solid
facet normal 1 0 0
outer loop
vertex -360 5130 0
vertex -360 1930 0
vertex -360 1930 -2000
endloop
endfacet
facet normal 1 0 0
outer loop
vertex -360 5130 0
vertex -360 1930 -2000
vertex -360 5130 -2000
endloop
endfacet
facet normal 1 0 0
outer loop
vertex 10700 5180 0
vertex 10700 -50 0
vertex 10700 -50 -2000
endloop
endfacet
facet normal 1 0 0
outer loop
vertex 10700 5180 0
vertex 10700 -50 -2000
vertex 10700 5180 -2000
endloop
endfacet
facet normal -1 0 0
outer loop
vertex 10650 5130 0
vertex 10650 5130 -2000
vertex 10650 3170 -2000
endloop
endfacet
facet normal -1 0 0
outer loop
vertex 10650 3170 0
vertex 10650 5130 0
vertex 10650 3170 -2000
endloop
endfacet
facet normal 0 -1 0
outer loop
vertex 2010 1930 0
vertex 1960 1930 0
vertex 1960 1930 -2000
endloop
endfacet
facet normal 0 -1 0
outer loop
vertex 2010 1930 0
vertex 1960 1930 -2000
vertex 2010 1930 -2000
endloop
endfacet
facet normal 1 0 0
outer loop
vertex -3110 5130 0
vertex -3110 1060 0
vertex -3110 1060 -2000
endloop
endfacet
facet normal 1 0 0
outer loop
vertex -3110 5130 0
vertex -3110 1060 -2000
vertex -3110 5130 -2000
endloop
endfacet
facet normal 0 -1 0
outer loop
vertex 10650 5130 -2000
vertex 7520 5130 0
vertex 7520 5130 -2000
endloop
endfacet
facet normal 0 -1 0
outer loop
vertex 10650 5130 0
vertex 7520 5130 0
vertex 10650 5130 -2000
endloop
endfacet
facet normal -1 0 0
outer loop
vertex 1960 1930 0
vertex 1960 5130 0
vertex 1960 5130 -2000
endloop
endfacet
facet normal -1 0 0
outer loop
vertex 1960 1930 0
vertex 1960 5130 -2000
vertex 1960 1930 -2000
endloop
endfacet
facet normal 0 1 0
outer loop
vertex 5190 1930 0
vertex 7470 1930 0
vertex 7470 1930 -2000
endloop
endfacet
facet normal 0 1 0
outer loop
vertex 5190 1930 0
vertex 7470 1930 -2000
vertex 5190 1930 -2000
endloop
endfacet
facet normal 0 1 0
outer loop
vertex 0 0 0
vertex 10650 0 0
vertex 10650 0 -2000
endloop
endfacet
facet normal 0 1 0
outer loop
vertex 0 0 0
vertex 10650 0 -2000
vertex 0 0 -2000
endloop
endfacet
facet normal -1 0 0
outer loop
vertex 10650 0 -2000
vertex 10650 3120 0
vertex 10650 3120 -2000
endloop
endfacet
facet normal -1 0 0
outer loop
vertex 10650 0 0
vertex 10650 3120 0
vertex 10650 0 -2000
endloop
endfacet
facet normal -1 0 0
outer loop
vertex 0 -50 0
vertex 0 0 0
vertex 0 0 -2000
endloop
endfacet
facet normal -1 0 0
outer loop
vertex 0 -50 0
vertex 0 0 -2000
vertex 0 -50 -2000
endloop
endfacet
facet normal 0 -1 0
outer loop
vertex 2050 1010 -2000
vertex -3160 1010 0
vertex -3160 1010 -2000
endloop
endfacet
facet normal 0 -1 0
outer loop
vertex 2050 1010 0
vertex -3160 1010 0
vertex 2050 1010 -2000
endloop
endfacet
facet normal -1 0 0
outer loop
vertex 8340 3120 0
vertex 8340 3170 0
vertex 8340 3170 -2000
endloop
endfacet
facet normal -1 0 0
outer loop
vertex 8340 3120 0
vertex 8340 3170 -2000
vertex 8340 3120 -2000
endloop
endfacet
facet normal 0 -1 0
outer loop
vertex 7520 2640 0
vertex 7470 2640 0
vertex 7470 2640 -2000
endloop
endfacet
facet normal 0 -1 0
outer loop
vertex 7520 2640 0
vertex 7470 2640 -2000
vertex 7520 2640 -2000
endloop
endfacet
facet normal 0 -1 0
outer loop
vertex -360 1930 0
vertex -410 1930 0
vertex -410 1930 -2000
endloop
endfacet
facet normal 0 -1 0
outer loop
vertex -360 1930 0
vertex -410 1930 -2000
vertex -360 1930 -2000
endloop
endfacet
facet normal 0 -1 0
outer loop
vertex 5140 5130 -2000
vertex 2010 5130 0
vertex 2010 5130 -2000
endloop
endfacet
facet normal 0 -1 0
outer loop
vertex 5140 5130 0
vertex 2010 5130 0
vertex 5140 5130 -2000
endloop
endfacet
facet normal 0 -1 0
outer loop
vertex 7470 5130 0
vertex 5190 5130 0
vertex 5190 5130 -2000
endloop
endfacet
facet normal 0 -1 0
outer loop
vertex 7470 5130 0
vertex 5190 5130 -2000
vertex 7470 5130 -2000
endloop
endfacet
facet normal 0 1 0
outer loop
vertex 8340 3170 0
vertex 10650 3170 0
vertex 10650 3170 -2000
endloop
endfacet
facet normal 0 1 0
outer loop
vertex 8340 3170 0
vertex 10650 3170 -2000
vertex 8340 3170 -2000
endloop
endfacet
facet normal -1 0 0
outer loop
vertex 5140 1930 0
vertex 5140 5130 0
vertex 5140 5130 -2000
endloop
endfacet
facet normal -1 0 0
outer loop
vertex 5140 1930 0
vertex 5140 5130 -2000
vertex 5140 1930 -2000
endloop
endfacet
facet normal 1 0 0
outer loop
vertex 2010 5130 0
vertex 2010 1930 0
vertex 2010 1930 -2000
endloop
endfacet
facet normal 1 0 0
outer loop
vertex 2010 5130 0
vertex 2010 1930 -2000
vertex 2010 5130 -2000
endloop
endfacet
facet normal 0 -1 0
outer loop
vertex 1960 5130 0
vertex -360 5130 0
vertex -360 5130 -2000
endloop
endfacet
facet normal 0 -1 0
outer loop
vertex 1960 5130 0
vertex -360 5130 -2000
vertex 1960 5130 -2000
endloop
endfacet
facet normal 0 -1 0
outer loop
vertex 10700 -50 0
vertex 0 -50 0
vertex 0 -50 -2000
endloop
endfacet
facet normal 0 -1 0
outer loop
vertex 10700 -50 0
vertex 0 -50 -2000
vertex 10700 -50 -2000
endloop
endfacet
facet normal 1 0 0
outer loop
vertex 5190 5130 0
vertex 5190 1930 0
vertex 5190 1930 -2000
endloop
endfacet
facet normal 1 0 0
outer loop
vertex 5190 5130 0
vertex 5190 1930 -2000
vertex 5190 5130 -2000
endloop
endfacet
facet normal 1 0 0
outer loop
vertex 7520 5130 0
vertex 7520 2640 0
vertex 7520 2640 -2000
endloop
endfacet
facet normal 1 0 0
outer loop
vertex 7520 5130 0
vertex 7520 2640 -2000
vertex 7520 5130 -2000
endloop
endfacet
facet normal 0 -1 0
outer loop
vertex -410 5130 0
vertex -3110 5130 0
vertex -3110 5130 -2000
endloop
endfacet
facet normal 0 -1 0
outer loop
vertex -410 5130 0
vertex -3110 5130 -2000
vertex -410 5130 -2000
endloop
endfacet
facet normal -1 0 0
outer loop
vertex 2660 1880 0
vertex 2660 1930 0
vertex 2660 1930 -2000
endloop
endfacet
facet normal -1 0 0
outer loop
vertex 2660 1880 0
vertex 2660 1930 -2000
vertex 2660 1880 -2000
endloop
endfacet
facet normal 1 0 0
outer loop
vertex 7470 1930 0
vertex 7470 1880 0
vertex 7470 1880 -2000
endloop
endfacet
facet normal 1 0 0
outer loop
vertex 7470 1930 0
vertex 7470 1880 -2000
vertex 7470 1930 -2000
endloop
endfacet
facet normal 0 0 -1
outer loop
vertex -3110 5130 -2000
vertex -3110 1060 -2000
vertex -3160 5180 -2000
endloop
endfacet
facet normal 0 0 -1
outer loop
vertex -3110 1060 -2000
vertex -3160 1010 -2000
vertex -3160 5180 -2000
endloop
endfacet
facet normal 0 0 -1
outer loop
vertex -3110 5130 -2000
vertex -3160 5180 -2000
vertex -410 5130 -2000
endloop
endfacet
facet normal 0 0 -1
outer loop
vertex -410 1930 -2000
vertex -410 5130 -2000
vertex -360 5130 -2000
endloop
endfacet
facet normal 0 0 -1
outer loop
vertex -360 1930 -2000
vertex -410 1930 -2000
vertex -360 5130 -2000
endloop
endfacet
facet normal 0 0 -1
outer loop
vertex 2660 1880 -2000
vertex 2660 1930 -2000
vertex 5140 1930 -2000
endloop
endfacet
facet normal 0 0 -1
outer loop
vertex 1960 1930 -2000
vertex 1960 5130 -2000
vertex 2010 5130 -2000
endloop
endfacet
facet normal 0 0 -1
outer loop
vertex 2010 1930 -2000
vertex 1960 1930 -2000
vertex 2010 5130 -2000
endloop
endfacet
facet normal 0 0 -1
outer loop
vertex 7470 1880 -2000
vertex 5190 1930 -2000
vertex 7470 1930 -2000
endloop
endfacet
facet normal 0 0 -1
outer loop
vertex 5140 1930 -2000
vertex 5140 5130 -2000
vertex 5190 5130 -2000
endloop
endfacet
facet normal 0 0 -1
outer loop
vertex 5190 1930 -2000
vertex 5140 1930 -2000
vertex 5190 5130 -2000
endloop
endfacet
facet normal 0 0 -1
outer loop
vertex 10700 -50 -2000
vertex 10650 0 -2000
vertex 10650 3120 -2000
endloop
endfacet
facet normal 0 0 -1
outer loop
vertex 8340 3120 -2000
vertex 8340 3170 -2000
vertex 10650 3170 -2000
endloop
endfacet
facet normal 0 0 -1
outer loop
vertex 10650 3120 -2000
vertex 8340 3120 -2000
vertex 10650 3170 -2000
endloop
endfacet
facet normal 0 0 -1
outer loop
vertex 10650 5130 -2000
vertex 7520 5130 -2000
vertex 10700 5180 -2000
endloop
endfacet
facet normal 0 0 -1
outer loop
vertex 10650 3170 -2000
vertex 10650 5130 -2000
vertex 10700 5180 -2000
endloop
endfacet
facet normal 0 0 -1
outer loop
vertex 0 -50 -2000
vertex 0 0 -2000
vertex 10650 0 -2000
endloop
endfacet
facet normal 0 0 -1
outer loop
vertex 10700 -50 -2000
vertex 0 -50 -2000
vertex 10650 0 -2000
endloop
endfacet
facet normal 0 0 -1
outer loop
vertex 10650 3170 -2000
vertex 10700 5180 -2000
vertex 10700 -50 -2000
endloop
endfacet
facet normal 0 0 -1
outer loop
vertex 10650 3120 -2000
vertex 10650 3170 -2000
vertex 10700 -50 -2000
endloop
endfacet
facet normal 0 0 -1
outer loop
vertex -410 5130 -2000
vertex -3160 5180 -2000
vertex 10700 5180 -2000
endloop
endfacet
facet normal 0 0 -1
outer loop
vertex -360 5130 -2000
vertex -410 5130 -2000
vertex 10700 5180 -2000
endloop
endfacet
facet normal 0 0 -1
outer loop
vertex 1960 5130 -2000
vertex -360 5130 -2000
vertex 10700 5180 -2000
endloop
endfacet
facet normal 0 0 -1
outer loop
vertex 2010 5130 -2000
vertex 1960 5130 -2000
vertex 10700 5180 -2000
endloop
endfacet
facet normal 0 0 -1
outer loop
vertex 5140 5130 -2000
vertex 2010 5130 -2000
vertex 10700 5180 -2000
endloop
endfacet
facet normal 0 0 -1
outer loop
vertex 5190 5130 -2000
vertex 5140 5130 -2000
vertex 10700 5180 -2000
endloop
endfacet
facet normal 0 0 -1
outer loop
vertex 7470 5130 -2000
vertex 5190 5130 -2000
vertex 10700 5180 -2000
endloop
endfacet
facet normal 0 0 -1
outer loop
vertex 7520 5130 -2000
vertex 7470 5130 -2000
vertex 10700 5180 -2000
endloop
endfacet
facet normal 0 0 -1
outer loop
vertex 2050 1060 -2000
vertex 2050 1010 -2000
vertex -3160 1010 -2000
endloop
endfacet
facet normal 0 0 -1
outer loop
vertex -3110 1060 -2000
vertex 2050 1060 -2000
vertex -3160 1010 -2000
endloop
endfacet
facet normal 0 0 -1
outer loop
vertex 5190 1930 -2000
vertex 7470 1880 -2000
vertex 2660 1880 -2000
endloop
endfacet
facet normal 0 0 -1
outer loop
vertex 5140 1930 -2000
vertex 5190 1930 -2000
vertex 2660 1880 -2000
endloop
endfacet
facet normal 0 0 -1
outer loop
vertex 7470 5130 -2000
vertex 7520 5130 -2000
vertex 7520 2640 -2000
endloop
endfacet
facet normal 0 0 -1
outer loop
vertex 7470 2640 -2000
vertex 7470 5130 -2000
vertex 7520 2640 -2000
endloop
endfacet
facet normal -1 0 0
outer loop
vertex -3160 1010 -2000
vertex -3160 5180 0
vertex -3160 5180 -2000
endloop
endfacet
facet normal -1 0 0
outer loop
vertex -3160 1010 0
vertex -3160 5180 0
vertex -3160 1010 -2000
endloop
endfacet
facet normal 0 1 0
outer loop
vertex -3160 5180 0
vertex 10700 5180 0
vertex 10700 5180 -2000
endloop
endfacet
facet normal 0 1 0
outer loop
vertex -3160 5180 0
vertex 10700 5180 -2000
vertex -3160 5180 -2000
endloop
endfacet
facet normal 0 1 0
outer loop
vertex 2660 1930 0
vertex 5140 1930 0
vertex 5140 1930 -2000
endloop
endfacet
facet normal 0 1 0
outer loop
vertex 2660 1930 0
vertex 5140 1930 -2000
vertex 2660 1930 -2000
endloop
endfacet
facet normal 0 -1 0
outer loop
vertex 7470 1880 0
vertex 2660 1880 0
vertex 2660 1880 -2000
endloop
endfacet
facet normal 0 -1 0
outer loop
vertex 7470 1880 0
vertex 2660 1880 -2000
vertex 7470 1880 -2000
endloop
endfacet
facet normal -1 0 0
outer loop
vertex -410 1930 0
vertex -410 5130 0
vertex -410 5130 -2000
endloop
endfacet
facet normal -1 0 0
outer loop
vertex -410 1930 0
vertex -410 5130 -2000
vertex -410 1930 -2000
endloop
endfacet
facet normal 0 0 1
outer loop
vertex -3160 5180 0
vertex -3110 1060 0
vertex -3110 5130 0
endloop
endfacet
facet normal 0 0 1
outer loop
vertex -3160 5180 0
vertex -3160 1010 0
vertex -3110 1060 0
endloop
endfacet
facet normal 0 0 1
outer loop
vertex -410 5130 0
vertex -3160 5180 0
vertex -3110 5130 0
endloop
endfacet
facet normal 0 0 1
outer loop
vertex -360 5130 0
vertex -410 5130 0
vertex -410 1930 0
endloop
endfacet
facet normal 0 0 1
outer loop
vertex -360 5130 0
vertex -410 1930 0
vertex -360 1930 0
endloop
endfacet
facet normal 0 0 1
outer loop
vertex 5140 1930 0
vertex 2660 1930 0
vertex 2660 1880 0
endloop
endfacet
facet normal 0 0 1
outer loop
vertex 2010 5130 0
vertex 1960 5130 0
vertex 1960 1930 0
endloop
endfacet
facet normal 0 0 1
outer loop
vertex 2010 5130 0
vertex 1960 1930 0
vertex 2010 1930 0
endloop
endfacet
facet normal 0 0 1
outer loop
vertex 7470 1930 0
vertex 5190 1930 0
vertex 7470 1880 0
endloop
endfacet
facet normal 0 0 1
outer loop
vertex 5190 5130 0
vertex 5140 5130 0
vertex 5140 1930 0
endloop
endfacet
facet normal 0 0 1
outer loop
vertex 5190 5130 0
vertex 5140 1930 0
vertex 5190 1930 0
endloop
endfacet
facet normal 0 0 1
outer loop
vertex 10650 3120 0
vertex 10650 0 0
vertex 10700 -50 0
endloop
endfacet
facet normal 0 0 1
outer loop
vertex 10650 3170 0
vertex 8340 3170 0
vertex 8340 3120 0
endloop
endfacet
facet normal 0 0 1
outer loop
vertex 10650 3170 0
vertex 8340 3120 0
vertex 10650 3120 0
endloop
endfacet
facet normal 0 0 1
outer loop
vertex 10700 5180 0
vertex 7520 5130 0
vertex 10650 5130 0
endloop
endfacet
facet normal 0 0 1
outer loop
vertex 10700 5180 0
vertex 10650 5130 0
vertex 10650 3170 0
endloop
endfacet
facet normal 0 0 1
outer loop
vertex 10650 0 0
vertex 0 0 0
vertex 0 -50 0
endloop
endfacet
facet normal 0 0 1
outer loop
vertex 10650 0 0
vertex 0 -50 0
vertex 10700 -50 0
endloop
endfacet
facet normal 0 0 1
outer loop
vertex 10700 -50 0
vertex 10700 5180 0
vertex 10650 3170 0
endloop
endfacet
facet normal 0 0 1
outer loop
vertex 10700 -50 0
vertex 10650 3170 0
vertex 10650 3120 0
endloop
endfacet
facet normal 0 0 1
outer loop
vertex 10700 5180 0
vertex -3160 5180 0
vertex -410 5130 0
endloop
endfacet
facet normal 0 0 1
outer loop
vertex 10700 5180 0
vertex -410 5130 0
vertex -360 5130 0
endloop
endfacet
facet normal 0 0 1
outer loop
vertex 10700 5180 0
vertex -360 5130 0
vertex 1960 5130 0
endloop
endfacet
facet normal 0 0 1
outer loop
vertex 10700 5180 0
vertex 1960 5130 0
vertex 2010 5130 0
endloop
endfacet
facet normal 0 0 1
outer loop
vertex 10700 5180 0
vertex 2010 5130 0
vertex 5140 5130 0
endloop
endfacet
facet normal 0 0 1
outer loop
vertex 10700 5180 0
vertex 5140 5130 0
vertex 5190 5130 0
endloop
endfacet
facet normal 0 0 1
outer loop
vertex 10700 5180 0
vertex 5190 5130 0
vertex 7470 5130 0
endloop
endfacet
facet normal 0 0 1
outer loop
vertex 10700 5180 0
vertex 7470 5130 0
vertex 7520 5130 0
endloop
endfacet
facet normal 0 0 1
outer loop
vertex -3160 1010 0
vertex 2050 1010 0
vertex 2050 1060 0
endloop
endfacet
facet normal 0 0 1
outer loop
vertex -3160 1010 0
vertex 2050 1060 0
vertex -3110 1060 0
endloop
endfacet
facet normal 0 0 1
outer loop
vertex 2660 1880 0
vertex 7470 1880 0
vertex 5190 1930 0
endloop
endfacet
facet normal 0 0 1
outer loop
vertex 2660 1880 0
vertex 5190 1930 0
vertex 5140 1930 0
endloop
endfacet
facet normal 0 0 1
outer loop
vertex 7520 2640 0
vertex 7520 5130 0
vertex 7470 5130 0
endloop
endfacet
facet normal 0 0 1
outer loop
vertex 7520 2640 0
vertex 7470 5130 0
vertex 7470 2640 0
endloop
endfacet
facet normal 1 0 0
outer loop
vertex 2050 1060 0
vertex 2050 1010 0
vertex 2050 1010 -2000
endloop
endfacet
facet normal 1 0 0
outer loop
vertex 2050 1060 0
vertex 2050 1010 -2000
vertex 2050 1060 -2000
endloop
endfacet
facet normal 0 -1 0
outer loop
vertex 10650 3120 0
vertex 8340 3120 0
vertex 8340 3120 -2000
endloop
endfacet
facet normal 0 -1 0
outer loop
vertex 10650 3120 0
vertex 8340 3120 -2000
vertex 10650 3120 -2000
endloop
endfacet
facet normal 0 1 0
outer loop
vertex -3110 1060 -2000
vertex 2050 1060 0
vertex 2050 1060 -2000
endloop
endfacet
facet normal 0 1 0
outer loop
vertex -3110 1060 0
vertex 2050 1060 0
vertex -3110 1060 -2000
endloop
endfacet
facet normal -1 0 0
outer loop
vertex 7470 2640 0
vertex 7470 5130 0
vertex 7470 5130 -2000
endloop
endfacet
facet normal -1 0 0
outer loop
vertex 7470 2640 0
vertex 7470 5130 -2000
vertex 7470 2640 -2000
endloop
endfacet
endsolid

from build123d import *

# Parameters (mm, degrees)
F1_DEPTH = 2000


with BuildPart() as f1:
    # F0 (on Top) → F1 (new body)
    with BuildSketch(Plane.XY):
        Polygon((10650, 0), (0, 0), (0, -50), (10700, -50), (10700, 5180), (-3160, 5180), (-3160, 1010), (2050, 1010), (2050, 1060), (0, 1060), (-3110, 1060), (-3110, 5130), (-410, 5130), (-410, 1930), (-360, 1930), (-360, 5130), (1960, 5130), (1960, 1930), (2010, 1930), (2010, 5130), (5140, 5130), (5140, 1930), (2660, 1930), (2660, 1880), (7470, 1880), (7470, 1930), (5190, 1930), (5190, 5130), (7470, 5130), (7470, 2640), (7520, 2640), (7520, 5130), (10650, 5130), (10650, 3170), (8340, 3170), (8340, 3120), (10650, 3120), align=None)
    extrude(amount=-F1_DEPTH)


solid = f1.part
